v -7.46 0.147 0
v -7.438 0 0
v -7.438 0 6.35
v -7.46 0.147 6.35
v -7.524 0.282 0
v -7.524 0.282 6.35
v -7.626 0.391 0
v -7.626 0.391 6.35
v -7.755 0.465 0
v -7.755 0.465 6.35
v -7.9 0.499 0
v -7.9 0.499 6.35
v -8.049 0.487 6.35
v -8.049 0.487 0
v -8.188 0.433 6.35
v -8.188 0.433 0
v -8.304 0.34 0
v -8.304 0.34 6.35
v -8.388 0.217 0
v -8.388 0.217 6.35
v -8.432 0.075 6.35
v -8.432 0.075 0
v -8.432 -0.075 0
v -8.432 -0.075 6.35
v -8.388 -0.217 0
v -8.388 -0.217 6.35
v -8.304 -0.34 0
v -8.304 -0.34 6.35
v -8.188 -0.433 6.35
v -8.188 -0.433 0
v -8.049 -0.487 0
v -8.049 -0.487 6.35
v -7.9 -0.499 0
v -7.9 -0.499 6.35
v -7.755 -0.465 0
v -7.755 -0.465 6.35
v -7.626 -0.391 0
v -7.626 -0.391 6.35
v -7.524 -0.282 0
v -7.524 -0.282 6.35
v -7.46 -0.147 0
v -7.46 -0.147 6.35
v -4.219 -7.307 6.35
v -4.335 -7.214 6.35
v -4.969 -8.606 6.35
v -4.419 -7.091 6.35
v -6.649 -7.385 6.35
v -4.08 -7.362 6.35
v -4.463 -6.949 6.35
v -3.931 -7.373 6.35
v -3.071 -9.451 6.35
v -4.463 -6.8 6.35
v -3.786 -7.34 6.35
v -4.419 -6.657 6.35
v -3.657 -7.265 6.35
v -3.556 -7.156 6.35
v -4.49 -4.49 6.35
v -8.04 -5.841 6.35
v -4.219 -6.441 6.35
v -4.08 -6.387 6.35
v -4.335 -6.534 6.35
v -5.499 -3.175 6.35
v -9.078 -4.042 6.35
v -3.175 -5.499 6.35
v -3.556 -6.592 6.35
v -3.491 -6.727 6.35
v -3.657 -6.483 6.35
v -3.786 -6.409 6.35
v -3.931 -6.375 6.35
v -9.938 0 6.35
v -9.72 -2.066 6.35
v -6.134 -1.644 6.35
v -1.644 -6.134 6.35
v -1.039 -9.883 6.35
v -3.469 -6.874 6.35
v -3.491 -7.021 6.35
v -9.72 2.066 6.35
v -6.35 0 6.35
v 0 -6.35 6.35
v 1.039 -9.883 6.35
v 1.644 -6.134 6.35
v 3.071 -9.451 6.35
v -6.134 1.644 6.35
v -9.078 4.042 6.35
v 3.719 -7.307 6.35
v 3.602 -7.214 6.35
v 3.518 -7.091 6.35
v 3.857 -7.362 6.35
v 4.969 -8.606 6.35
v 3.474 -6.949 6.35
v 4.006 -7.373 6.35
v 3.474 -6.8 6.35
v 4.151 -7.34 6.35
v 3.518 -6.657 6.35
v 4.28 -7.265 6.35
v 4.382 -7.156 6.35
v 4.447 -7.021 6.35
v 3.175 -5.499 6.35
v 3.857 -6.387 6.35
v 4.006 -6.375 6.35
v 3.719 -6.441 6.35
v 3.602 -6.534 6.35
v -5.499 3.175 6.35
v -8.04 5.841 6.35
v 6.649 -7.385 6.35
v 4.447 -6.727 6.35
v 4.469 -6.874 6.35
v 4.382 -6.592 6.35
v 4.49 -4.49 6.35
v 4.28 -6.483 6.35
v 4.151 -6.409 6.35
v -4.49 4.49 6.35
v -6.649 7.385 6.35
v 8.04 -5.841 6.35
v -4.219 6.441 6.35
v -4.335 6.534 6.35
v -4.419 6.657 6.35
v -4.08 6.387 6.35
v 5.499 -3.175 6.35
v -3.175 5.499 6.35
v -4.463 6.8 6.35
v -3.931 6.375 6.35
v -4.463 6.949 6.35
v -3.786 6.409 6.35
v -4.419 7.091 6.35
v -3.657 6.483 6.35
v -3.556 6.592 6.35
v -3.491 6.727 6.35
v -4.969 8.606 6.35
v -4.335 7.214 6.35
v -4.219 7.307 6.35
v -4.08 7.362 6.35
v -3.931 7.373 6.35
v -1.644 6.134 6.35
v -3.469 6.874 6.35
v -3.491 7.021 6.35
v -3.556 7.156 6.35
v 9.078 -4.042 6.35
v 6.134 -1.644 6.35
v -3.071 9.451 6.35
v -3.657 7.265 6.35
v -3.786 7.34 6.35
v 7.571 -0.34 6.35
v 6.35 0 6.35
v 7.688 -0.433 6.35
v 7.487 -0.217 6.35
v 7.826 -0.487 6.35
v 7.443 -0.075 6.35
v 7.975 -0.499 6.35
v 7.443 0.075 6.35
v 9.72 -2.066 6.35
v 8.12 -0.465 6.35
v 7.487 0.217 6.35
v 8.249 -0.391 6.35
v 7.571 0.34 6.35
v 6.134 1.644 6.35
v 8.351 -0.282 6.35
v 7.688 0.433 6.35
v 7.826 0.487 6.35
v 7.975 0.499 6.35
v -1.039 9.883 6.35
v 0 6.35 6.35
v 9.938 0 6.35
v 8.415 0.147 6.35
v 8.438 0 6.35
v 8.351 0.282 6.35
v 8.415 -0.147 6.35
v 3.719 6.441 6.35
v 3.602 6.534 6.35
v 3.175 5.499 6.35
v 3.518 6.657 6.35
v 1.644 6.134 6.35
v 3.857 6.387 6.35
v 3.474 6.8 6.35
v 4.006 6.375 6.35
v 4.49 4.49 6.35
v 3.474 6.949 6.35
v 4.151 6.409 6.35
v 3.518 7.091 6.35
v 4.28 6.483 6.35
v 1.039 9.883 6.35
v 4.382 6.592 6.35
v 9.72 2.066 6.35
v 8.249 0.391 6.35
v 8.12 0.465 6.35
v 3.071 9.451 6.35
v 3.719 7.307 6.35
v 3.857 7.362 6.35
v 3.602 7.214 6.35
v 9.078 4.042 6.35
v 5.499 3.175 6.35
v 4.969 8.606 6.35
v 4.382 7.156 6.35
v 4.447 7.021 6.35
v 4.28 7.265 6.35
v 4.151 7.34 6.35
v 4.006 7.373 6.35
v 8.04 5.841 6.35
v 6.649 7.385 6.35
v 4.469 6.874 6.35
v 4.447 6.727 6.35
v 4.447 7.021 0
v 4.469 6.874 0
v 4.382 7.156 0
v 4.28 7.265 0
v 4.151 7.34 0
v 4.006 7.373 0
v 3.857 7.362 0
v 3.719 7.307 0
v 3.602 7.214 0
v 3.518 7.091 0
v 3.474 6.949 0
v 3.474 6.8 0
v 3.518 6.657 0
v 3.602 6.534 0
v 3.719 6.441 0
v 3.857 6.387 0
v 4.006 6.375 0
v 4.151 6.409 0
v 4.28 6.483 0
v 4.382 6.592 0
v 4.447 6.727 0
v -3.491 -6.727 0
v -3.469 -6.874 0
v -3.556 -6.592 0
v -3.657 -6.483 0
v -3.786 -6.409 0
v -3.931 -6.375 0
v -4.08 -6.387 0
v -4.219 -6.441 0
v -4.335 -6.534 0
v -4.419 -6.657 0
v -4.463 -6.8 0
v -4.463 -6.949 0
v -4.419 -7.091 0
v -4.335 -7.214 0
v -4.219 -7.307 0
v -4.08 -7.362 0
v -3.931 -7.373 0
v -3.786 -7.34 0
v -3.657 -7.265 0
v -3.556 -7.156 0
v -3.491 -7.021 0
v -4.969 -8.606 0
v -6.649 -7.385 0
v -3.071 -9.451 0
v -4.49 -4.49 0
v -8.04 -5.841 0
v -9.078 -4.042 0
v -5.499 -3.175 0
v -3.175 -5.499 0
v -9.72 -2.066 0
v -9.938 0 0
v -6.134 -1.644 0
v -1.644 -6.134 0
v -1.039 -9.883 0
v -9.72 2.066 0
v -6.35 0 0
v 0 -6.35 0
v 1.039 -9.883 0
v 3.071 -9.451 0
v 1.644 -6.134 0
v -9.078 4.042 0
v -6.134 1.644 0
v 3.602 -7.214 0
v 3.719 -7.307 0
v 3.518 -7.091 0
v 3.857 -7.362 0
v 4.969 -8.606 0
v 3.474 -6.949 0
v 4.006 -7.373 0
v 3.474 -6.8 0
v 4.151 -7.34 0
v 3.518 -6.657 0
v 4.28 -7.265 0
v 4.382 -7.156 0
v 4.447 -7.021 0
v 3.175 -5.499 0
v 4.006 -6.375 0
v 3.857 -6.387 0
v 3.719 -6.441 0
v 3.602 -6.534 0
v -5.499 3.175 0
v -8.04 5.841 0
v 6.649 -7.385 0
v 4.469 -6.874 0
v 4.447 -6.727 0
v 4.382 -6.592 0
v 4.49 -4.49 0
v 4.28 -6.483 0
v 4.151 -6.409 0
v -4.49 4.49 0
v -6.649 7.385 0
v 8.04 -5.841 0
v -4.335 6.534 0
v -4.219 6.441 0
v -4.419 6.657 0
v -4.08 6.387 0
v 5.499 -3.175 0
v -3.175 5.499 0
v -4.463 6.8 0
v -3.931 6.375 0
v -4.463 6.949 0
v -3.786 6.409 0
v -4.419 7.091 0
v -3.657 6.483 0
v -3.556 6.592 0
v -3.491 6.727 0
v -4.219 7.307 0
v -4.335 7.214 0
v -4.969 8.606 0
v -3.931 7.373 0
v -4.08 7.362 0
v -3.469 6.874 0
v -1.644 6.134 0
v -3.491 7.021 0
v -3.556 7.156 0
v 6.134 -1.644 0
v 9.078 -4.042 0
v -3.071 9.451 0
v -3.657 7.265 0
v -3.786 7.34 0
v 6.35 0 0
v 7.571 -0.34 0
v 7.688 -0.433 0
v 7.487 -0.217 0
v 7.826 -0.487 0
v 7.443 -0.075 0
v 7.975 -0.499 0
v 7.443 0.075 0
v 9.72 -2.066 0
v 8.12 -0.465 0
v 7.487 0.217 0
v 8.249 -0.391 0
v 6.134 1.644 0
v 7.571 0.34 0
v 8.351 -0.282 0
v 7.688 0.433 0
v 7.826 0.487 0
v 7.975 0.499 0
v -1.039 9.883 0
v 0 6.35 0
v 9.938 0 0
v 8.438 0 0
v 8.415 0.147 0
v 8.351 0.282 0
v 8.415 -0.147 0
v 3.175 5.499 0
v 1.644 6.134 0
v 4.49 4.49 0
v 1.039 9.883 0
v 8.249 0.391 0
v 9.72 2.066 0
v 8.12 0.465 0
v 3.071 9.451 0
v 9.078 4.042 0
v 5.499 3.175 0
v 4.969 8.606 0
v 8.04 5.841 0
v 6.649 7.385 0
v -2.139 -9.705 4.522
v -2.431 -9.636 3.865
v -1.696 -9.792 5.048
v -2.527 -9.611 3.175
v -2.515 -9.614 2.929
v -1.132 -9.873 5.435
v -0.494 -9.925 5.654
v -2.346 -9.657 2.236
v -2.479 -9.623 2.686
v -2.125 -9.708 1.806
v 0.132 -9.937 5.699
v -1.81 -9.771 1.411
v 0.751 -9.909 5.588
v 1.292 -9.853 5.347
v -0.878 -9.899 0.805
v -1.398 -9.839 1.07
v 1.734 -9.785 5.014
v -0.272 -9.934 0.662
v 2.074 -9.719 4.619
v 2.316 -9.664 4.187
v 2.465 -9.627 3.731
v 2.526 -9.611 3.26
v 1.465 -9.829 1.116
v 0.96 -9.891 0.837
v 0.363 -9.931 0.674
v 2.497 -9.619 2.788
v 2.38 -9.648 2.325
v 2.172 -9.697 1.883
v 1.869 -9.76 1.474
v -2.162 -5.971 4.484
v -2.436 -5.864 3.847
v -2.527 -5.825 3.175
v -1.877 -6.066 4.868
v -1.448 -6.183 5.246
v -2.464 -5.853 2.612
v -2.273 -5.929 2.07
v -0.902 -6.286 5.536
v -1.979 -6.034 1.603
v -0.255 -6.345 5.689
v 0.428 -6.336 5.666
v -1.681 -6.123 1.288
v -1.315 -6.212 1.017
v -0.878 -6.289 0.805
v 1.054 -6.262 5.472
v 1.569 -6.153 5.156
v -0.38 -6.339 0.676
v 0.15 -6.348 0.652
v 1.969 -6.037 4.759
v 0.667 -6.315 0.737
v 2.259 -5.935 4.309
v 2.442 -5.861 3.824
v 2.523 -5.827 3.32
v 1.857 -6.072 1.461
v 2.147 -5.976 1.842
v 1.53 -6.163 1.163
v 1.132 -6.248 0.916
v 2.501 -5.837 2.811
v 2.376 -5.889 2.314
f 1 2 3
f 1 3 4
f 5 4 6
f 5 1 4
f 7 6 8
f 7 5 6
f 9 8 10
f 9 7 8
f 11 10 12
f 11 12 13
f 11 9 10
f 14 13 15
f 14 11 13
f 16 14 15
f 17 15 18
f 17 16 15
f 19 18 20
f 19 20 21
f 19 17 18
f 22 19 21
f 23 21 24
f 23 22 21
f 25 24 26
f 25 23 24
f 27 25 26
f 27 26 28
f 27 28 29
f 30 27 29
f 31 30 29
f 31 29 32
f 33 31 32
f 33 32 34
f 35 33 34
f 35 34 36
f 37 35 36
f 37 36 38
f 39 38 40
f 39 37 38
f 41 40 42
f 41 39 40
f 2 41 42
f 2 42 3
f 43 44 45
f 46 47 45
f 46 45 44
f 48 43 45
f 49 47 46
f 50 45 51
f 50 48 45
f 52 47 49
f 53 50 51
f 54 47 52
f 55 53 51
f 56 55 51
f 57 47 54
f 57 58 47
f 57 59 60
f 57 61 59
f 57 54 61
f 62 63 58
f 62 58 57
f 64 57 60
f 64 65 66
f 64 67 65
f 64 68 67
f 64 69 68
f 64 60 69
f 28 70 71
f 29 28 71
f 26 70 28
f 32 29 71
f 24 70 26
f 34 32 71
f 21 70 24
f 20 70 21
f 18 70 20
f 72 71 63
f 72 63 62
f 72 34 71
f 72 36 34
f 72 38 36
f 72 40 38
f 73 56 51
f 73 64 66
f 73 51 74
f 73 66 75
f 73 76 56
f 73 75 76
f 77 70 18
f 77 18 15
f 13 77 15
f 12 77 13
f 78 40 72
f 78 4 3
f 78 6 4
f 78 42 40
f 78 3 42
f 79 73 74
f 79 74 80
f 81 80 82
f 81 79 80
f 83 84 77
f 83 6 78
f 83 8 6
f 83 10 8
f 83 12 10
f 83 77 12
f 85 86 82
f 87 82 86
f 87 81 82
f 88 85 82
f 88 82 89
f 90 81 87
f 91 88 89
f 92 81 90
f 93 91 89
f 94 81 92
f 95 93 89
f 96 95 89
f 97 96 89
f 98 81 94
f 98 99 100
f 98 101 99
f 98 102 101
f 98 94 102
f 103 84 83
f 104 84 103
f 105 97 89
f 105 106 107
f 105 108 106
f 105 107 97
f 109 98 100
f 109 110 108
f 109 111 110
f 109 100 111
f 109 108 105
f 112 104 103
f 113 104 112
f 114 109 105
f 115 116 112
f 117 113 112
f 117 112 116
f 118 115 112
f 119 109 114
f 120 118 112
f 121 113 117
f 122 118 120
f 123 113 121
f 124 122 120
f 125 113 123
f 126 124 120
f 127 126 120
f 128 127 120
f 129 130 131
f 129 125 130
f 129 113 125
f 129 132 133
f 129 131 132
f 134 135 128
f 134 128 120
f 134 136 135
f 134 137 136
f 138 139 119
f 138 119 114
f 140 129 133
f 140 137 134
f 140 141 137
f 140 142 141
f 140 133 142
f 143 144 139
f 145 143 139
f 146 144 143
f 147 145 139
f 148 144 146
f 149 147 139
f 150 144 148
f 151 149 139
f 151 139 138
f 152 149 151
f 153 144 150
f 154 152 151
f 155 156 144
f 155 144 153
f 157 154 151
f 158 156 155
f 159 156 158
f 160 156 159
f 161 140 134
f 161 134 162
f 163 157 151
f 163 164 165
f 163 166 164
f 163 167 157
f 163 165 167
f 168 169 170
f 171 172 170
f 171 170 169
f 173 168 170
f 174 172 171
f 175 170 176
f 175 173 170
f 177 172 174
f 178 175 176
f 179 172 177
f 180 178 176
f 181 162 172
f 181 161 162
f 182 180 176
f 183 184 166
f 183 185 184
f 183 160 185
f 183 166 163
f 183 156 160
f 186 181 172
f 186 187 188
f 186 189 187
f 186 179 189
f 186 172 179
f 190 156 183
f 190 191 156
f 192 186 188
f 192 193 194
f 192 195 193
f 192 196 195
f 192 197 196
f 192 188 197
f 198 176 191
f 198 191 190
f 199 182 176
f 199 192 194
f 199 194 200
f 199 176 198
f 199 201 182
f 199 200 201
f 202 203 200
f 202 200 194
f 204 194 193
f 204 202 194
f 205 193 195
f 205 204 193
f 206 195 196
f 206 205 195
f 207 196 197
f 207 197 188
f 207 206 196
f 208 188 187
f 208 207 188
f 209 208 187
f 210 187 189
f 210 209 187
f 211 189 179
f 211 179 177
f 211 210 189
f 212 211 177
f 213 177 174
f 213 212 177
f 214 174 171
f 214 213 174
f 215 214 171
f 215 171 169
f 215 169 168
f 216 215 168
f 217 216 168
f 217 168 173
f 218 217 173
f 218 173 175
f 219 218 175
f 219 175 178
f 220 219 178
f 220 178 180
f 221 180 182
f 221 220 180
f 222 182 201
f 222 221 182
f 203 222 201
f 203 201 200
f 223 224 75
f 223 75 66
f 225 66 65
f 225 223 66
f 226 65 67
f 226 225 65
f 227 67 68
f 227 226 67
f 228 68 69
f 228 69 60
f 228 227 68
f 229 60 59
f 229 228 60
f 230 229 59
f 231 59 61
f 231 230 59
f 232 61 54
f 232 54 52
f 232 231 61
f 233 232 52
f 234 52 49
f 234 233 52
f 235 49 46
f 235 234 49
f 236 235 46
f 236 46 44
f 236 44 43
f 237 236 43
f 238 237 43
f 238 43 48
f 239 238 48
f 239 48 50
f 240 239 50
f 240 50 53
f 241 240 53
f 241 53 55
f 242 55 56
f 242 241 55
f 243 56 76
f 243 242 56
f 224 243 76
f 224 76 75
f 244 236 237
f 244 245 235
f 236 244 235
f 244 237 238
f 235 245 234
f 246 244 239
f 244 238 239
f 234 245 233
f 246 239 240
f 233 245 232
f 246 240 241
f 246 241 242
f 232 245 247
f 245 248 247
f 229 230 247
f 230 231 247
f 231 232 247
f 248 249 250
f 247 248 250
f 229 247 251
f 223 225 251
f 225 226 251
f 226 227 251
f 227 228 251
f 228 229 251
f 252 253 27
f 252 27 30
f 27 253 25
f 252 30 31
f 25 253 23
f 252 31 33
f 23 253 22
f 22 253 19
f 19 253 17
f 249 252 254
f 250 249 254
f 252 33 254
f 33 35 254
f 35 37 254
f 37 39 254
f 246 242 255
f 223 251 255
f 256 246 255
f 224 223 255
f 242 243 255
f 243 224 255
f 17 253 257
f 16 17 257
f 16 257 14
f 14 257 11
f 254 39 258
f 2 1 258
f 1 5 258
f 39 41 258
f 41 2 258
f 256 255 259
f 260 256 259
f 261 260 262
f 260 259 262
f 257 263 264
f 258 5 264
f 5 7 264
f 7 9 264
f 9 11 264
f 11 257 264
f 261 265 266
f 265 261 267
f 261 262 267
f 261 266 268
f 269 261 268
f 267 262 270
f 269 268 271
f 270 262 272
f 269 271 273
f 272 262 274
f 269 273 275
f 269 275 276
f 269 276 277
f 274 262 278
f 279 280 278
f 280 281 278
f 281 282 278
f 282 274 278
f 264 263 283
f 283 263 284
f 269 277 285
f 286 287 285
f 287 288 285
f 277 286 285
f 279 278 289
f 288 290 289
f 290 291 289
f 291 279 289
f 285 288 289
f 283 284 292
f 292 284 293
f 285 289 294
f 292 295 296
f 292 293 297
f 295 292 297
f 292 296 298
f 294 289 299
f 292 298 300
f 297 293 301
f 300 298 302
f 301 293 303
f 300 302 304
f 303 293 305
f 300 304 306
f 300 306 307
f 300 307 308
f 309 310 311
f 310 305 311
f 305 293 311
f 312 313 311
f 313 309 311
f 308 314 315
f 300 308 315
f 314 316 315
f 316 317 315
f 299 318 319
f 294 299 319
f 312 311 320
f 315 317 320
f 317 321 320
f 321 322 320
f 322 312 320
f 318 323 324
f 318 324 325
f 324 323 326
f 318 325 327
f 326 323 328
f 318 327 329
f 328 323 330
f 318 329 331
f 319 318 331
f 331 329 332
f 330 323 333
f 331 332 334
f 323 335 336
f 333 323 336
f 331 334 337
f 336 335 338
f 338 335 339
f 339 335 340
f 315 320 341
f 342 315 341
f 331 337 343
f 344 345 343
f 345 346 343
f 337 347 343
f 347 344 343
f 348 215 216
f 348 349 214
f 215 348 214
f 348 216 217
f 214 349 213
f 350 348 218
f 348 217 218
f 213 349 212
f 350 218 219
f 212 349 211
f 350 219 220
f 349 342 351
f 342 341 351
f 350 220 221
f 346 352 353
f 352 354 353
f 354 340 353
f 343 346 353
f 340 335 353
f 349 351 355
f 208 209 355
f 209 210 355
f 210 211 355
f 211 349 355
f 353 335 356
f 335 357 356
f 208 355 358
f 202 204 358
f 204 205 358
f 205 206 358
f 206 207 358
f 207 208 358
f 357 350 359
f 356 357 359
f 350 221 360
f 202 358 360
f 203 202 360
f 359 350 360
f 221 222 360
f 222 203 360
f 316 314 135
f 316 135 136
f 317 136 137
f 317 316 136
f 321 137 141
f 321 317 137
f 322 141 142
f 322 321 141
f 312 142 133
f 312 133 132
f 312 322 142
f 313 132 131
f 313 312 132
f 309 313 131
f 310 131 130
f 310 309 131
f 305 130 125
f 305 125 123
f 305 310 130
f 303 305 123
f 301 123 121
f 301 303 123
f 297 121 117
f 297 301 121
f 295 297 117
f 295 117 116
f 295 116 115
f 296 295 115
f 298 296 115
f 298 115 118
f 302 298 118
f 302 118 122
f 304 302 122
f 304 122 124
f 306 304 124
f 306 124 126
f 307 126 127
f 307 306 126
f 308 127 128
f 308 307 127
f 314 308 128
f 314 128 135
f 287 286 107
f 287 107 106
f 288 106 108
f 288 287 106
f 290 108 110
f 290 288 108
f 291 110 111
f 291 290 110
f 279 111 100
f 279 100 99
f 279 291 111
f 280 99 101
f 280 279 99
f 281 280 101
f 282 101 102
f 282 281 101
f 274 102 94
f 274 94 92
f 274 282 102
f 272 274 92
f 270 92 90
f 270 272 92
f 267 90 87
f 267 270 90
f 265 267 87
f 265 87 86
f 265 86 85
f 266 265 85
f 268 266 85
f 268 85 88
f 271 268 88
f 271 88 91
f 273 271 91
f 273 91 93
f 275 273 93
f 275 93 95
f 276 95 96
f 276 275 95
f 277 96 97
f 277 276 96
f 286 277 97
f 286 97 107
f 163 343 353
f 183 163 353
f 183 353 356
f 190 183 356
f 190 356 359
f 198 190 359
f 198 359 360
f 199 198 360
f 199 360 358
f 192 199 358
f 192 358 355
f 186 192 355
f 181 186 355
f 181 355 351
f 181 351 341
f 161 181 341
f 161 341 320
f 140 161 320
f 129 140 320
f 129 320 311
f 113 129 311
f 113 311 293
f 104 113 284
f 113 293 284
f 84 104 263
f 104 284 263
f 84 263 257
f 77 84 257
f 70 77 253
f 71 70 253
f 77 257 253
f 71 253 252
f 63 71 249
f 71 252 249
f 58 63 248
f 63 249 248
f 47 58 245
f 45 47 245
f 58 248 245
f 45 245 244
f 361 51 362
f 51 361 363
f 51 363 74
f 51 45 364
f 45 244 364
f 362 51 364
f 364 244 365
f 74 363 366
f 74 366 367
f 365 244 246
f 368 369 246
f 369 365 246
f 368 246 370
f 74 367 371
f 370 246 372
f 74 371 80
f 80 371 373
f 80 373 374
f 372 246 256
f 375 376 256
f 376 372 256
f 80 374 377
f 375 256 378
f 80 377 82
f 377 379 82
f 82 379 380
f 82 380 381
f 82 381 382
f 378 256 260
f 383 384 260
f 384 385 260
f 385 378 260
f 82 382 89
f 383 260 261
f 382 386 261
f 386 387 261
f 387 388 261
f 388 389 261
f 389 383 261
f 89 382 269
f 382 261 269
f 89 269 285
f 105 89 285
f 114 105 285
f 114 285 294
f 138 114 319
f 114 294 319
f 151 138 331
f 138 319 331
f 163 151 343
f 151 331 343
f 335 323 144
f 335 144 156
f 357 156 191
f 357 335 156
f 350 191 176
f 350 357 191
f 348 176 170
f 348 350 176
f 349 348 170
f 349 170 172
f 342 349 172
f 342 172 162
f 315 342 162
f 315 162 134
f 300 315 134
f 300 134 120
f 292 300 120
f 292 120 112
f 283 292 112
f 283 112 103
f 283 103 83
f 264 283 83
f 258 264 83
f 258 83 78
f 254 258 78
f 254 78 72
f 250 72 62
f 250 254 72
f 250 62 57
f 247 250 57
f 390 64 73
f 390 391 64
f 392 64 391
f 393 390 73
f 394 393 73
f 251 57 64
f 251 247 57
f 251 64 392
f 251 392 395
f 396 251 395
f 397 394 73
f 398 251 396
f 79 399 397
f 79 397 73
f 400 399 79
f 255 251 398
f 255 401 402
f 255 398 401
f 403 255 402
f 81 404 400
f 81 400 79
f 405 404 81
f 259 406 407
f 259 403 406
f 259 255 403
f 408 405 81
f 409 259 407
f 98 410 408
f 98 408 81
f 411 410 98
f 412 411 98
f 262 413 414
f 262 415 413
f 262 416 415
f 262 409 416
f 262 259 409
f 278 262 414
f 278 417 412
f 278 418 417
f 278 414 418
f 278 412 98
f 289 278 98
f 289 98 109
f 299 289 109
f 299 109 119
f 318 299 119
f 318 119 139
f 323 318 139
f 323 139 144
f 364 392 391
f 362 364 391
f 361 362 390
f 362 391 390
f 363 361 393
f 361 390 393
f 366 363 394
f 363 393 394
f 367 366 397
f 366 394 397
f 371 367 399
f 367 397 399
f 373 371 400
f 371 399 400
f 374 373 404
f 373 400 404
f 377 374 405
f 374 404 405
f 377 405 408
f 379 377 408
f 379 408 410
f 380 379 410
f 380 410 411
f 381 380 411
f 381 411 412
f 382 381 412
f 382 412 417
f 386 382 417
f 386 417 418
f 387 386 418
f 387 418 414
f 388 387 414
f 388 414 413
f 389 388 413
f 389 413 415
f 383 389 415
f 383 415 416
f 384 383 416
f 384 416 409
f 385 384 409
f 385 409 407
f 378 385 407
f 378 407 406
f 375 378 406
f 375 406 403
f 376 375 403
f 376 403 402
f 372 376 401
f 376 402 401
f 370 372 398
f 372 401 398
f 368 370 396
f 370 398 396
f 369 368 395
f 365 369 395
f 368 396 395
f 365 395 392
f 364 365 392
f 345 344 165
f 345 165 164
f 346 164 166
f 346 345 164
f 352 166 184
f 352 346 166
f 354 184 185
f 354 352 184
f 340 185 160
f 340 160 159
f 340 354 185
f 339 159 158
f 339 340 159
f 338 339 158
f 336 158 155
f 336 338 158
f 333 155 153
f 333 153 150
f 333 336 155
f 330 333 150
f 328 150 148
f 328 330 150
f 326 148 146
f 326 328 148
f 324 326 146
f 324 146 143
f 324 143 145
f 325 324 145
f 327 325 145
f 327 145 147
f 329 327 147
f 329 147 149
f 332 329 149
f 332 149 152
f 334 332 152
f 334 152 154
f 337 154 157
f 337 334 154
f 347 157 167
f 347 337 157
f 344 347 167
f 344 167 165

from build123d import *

# Parameters (mm, degrees)
SKETCH1_R                      = 9.9375
SKETCH1_R_2                    = 6.35
SKETCH1_R_3                    = 0.5
BOSS_EXTRUDE1_DEPTH            = 6.35
F_8_0_199_DIAMETER_HOLE1_D     = 5.0546
F_8_0_199_DIAMETER_HOLE1_DEPTH = 8.35
F_8_0_199_DIAMETER_HOLE1_TIP   = 1.518555042


with BuildPart() as part:
    # Sketch1 → Boss-Extrude1 (new body)
    with BuildSketch(Plane.XY):
        Circle(SKETCH1_R)
        Circle(SKETCH1_R_2, mode=Mode.SUBTRACT)
        with Locations((-7.9375, 0)):
            Circle(SKETCH1_R_3, mode=Mode.SUBTRACT)
        with Locations((-3.96875, 6.874076643)):
            Circle(SKETCH1_R_3, mode=Mode.SUBTRACT)
        with Locations((3.96875, 6.874076643)):
            Circle(SKETCH1_R_3, mode=Mode.SUBTRACT)
        with Locations((7.9375, 0)):
            Circle(SKETCH1_R_3, mode=Mode.SUBTRACT)
        with Locations((3.96875, -6.874076643)):
            Circle(SKETCH1_R_3, mode=Mode.SUBTRACT)
        with Locations((-3.96875, -6.874076643)):
            Circle(SKETCH1_R_3, mode=Mode.SUBTRACT)
    extrude(amount=BOSS_EXTRUDE1_DEPTH)

    # #8 (0.199) Diameter Hole1
    with Locations(Plane.XZ.offset(9.9375)):
        with Locations((0, 3.175)):
            Hole(F_8_0_199_DIAMETER_HOLE1_D / 2, depth=F_8_0_199_DIAMETER_HOLE1_DEPTH)
            with Locations((0, 0, -(F_8_0_199_DIAMETER_HOLE1_DEPTH + F_8_0_199_DIAMETER_HOLE1_TIP / 2))):  # 118° drill point
                Cone(0, F_8_0_199_DIAMETER_HOLE1_D / 2, F_8_0_199_DIAMETER_HOLE1_TIP, mode=Mode.SUBTRACT)


solid = part.part
